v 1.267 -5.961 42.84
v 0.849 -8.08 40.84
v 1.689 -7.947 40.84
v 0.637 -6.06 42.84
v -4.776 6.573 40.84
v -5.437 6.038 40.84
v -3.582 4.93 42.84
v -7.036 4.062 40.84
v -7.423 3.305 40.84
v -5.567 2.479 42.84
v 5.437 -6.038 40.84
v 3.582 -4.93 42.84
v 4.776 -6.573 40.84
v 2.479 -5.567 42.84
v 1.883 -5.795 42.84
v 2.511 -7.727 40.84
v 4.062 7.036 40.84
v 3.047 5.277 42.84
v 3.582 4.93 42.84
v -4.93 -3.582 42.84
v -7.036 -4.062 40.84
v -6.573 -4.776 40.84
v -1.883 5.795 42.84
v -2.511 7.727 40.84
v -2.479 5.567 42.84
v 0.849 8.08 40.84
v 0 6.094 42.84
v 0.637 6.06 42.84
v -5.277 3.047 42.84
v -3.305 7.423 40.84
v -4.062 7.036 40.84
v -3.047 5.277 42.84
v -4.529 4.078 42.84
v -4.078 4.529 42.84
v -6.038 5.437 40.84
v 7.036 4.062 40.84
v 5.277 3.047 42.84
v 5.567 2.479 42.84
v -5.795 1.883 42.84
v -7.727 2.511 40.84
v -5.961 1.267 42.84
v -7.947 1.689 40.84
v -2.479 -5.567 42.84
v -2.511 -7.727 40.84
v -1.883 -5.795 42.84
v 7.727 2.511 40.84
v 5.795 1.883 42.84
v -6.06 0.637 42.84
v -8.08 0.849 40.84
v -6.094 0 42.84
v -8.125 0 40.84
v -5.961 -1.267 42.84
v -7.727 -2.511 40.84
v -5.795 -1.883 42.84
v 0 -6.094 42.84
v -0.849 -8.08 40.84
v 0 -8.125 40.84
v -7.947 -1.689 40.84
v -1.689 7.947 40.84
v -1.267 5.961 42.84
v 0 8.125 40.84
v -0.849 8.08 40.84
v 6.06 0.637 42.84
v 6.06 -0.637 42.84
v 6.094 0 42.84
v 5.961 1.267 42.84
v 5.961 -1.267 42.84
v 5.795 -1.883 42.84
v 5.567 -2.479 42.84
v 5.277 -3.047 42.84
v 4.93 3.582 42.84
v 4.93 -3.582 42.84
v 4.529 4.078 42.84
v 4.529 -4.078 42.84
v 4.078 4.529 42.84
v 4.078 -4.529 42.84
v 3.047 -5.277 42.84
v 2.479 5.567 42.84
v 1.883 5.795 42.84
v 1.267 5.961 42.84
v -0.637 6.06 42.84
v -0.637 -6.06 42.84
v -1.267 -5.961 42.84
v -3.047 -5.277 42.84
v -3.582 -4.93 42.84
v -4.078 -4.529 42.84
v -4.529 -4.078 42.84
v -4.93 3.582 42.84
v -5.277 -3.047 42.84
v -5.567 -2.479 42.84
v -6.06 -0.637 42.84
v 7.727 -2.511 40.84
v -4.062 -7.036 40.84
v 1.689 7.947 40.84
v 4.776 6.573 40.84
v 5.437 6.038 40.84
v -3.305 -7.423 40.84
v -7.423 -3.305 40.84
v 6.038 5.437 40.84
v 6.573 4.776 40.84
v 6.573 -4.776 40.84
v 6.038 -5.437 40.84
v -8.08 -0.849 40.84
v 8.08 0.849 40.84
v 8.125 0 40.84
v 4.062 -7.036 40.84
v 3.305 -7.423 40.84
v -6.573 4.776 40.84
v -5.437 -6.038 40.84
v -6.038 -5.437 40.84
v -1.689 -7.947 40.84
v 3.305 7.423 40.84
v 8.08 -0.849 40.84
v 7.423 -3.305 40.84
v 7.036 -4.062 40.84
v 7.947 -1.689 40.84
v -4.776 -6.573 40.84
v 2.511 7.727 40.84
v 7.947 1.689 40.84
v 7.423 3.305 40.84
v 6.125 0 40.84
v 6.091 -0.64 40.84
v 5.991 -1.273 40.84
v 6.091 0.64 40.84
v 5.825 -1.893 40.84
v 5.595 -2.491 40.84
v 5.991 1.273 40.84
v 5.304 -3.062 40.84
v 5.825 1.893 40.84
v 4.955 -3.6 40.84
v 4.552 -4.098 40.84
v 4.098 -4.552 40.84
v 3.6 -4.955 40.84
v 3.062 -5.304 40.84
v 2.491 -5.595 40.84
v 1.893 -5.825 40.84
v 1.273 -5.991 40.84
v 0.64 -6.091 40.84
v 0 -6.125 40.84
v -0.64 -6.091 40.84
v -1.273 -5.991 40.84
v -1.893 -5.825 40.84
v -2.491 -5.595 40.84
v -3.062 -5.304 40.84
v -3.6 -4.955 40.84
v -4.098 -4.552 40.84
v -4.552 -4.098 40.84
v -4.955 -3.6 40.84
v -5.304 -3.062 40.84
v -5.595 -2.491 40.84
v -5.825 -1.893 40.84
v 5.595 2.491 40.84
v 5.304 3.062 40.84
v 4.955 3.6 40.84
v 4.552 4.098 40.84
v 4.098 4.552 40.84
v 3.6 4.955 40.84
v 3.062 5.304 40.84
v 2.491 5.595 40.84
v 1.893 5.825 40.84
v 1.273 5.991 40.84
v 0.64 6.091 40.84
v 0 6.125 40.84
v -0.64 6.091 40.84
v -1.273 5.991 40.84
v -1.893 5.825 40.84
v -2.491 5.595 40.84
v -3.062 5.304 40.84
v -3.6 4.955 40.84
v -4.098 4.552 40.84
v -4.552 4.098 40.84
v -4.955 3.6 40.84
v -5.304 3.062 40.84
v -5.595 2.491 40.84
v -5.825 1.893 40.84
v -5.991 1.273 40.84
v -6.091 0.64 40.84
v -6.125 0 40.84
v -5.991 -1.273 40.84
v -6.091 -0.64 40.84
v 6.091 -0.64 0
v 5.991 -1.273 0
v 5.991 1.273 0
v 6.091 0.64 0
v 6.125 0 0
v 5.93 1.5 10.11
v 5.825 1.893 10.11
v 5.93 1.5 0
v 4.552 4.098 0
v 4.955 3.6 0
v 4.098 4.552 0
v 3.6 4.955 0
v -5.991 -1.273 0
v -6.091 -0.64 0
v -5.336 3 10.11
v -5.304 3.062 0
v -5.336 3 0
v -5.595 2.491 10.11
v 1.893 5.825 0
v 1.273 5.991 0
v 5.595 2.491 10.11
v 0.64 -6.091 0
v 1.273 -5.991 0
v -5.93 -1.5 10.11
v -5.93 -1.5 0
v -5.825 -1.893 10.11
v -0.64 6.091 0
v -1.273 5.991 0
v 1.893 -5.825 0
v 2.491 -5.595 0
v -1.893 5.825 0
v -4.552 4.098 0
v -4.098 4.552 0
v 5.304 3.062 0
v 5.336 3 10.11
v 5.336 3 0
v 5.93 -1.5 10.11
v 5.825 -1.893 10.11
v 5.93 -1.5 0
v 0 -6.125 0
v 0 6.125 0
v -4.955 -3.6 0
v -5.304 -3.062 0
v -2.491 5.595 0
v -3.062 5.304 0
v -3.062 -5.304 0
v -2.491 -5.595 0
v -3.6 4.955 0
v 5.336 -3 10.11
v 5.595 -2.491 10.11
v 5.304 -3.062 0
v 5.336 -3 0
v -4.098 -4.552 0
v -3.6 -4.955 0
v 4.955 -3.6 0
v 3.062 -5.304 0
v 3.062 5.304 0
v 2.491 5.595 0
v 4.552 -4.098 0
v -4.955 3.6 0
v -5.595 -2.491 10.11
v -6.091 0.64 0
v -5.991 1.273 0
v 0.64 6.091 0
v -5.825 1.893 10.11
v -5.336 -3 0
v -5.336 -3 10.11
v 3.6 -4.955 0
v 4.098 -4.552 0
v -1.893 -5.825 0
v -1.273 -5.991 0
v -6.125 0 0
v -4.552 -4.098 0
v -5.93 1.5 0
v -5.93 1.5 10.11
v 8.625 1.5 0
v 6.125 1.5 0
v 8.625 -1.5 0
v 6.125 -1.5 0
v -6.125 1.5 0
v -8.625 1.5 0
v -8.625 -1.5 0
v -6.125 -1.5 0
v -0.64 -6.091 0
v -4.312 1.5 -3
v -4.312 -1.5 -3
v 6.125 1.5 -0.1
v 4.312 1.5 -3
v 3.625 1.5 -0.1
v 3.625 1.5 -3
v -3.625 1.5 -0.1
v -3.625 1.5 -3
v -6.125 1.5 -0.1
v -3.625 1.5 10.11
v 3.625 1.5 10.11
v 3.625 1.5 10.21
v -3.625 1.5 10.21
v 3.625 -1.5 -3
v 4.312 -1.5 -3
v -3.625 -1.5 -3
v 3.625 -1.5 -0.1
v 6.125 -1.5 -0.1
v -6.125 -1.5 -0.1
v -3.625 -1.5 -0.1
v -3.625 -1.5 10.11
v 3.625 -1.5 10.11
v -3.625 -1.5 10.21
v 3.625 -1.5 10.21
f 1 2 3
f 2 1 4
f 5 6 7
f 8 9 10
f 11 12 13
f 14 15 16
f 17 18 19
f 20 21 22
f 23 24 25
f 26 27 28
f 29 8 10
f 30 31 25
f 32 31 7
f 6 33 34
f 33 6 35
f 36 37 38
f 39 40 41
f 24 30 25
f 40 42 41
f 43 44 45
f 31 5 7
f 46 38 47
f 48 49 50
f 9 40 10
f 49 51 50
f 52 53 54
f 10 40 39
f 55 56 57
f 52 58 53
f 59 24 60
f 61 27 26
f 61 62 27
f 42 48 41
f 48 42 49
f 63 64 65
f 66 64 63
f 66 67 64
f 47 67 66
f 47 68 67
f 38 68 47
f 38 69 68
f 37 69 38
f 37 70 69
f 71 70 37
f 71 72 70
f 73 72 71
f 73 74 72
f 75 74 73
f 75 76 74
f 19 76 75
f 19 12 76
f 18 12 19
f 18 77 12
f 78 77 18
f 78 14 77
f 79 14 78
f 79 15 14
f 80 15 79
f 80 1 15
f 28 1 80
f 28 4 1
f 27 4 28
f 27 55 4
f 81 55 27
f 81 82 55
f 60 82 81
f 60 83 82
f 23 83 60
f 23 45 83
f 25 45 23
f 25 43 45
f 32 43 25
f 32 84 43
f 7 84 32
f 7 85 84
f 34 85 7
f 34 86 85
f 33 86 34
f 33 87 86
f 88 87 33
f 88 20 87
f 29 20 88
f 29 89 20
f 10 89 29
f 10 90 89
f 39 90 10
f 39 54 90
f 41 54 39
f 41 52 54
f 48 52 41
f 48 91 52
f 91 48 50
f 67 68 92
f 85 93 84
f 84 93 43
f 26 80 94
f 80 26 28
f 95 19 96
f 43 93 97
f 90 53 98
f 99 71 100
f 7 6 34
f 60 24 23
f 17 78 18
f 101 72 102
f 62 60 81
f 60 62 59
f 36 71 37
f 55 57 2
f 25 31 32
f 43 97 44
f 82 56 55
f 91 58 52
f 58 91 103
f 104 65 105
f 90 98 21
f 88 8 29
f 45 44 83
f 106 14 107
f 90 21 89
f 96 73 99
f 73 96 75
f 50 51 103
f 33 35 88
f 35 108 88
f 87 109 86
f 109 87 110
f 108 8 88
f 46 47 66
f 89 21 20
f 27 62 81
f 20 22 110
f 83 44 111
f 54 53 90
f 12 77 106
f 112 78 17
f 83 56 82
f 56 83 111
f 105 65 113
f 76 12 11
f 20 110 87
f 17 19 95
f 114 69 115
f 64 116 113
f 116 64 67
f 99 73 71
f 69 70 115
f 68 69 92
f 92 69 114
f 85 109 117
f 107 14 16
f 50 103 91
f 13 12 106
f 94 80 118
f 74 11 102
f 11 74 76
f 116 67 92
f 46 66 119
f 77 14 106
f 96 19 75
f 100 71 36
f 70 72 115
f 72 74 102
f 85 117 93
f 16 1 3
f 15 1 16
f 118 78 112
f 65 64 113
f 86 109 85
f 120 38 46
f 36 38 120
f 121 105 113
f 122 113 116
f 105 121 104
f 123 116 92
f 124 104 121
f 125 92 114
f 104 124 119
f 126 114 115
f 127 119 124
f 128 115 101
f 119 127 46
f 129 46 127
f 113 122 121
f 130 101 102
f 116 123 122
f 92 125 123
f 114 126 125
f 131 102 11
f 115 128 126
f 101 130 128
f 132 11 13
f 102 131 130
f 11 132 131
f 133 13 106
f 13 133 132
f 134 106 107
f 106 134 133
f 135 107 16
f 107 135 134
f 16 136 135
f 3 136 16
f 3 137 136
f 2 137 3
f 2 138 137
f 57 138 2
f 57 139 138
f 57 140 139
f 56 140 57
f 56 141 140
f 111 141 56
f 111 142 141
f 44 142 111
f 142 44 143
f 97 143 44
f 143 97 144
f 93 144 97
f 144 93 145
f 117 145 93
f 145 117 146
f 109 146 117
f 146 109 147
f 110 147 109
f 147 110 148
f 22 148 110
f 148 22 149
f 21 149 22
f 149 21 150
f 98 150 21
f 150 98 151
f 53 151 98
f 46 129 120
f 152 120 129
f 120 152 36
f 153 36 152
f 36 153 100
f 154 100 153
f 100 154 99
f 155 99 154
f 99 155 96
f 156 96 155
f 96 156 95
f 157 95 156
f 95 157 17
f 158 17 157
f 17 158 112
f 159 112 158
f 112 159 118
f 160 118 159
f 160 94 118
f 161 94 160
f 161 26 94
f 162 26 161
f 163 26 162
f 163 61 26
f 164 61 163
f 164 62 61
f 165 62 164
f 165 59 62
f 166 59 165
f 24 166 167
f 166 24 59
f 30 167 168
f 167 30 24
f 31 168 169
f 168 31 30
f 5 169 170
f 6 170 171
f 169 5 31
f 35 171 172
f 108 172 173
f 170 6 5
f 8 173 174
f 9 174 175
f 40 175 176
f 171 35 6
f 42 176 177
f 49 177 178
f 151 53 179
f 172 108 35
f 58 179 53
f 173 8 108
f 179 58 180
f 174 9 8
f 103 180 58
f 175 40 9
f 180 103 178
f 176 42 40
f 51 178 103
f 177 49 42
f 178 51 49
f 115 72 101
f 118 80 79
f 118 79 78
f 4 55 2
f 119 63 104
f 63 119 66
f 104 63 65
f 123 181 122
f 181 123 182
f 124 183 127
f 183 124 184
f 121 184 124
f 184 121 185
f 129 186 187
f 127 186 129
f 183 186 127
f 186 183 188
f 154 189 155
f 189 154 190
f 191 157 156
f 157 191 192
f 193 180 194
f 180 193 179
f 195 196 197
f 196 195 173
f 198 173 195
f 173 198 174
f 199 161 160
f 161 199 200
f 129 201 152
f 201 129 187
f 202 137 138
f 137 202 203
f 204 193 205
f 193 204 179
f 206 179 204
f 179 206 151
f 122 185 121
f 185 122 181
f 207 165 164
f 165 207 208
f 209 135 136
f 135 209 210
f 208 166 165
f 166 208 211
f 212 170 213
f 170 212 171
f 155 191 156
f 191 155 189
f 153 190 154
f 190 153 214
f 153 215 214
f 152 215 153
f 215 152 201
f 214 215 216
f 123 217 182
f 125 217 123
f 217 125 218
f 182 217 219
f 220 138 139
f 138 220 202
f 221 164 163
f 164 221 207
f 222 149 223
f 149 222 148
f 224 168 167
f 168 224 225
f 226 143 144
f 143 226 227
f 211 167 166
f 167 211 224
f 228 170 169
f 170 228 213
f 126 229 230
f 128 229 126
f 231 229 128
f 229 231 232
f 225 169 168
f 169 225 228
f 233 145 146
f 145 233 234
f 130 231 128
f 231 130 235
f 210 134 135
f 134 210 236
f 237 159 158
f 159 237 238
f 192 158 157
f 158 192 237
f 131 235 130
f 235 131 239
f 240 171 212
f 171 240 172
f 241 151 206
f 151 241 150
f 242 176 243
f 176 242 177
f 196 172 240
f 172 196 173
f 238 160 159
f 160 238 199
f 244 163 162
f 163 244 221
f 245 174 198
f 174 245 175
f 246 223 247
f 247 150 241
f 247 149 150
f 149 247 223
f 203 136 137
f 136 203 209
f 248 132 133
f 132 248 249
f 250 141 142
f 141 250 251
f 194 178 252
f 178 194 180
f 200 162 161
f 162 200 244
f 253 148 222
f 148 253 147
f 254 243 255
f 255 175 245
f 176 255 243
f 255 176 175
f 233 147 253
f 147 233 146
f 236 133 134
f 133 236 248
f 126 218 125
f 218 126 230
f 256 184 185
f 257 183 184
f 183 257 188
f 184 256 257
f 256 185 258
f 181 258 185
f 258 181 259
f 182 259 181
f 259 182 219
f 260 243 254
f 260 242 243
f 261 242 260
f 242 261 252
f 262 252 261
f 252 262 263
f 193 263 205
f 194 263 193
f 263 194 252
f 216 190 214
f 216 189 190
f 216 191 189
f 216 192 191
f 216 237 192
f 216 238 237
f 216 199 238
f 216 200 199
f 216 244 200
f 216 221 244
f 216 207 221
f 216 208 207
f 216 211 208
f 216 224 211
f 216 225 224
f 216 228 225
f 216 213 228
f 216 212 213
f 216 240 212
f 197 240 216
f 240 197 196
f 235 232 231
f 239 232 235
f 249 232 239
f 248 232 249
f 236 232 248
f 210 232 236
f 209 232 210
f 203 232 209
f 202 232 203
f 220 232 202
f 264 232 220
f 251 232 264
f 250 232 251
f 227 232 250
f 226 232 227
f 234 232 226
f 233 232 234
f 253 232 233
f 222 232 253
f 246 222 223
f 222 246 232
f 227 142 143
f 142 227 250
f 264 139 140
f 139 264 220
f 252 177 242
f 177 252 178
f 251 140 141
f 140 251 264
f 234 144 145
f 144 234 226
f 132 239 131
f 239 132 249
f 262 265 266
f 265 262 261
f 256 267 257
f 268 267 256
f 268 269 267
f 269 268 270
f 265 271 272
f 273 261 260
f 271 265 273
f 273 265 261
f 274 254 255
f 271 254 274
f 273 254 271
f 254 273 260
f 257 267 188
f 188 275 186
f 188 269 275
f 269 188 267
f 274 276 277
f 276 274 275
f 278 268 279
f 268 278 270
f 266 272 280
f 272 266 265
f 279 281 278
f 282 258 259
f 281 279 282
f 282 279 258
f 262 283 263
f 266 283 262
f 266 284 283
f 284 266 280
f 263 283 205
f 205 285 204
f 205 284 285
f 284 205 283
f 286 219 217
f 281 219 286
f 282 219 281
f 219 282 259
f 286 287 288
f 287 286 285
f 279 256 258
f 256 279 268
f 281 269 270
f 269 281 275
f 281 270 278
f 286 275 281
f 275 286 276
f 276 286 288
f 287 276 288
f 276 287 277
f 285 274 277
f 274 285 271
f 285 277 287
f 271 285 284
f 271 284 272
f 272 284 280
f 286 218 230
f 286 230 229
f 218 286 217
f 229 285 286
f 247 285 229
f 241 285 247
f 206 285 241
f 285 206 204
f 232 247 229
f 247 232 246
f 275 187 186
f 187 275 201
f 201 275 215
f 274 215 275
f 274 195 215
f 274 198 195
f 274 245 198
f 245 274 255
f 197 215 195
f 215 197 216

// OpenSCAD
//How deep is the hole to plug?
PlugH = 40.84; // [1:.25:100]
//What is the diameter of the hole to plug?
PlugD = 12.25; // [1:.25:100]

//How much larger than the plug should I make the cap? (0 for no cap)
CapD = 4; //[0:50]
//How tall should I make the cap? (0 for no cap)
CapH = 2; //[0:50]
//Do you want a dimple in the cap?
CapDimple = 0; // [1:yes,0:no]

//How tall should I make the the retention clips? (0 for no clips)
ClipH=3;  //[0:.25:10]
//How wide should I make the the retention clips? (0 for no clips)
ClipW=3; //[0:.25:10]
//Select the quality (resolution) of the model
Resolution = 60; //[60:Draft,180:Good,270:Better,360:Best]

$fn=Resolution;

CLipL = PlugD+5;

color("gray")
difference() {    
    union(){
        translate([0,0,PlugH])
            Cap(CapD+PlugD,CapH,25,CapDimple);
        cylinder(d=PlugD,h=PlugH);
        if (ClipH > 0 && ClipW > 0) {
            translate([-CLipL/2,0,0])
                ClipEnd(CLipL,ClipH,ClipW) ;
        }
    }
    if (ClipH > 0 && ClipW > 0) {
        translate([-(PlugD-5)/2,-ClipW/2,-ClipH])
            cube([PlugD-5,ClipW,(PlugH*.25)+ClipH]);
        translate([-PlugD/2,-(ClipW/2)-1.5,-.1])
            cube([PlugD,1.5,PlugH*.25]);
        translate([-PlugD/2,ClipW/2,-.1])
            cube([PlugD,1.5,PlugH*.25]);
    }
}

module Cap(Len,Height,Bevel,Dimple) {
    BevAdj = Bevel * .01;
    Dia=Len/2;
    rotate_extrude(convexity = 10)    
    polygon(points = [
                      [0,0]
                     ,[(Dia*(BevAdj*Dimple)),Height]
                     ,[Dia,0]
                     ,[(Dia*(1-BevAdj)),Height]
                     ]
            ,paths=[[0,1,3,2]]  
     );  
}

module ClipEnd(Len,Height,Width) {
    rotate([-90,0,0])
    linear_extrude(height = Width, center = true, convexity = 10, scale = 1.0) 
    polygon(points = [
                      [0,0]
                     ,[(Len*.25),Height]
                     ,[Len,0]
                     ,[(Len*.75),Height]
                     ]
            ,paths=[[0,1,3,2]]
    );
}
    
